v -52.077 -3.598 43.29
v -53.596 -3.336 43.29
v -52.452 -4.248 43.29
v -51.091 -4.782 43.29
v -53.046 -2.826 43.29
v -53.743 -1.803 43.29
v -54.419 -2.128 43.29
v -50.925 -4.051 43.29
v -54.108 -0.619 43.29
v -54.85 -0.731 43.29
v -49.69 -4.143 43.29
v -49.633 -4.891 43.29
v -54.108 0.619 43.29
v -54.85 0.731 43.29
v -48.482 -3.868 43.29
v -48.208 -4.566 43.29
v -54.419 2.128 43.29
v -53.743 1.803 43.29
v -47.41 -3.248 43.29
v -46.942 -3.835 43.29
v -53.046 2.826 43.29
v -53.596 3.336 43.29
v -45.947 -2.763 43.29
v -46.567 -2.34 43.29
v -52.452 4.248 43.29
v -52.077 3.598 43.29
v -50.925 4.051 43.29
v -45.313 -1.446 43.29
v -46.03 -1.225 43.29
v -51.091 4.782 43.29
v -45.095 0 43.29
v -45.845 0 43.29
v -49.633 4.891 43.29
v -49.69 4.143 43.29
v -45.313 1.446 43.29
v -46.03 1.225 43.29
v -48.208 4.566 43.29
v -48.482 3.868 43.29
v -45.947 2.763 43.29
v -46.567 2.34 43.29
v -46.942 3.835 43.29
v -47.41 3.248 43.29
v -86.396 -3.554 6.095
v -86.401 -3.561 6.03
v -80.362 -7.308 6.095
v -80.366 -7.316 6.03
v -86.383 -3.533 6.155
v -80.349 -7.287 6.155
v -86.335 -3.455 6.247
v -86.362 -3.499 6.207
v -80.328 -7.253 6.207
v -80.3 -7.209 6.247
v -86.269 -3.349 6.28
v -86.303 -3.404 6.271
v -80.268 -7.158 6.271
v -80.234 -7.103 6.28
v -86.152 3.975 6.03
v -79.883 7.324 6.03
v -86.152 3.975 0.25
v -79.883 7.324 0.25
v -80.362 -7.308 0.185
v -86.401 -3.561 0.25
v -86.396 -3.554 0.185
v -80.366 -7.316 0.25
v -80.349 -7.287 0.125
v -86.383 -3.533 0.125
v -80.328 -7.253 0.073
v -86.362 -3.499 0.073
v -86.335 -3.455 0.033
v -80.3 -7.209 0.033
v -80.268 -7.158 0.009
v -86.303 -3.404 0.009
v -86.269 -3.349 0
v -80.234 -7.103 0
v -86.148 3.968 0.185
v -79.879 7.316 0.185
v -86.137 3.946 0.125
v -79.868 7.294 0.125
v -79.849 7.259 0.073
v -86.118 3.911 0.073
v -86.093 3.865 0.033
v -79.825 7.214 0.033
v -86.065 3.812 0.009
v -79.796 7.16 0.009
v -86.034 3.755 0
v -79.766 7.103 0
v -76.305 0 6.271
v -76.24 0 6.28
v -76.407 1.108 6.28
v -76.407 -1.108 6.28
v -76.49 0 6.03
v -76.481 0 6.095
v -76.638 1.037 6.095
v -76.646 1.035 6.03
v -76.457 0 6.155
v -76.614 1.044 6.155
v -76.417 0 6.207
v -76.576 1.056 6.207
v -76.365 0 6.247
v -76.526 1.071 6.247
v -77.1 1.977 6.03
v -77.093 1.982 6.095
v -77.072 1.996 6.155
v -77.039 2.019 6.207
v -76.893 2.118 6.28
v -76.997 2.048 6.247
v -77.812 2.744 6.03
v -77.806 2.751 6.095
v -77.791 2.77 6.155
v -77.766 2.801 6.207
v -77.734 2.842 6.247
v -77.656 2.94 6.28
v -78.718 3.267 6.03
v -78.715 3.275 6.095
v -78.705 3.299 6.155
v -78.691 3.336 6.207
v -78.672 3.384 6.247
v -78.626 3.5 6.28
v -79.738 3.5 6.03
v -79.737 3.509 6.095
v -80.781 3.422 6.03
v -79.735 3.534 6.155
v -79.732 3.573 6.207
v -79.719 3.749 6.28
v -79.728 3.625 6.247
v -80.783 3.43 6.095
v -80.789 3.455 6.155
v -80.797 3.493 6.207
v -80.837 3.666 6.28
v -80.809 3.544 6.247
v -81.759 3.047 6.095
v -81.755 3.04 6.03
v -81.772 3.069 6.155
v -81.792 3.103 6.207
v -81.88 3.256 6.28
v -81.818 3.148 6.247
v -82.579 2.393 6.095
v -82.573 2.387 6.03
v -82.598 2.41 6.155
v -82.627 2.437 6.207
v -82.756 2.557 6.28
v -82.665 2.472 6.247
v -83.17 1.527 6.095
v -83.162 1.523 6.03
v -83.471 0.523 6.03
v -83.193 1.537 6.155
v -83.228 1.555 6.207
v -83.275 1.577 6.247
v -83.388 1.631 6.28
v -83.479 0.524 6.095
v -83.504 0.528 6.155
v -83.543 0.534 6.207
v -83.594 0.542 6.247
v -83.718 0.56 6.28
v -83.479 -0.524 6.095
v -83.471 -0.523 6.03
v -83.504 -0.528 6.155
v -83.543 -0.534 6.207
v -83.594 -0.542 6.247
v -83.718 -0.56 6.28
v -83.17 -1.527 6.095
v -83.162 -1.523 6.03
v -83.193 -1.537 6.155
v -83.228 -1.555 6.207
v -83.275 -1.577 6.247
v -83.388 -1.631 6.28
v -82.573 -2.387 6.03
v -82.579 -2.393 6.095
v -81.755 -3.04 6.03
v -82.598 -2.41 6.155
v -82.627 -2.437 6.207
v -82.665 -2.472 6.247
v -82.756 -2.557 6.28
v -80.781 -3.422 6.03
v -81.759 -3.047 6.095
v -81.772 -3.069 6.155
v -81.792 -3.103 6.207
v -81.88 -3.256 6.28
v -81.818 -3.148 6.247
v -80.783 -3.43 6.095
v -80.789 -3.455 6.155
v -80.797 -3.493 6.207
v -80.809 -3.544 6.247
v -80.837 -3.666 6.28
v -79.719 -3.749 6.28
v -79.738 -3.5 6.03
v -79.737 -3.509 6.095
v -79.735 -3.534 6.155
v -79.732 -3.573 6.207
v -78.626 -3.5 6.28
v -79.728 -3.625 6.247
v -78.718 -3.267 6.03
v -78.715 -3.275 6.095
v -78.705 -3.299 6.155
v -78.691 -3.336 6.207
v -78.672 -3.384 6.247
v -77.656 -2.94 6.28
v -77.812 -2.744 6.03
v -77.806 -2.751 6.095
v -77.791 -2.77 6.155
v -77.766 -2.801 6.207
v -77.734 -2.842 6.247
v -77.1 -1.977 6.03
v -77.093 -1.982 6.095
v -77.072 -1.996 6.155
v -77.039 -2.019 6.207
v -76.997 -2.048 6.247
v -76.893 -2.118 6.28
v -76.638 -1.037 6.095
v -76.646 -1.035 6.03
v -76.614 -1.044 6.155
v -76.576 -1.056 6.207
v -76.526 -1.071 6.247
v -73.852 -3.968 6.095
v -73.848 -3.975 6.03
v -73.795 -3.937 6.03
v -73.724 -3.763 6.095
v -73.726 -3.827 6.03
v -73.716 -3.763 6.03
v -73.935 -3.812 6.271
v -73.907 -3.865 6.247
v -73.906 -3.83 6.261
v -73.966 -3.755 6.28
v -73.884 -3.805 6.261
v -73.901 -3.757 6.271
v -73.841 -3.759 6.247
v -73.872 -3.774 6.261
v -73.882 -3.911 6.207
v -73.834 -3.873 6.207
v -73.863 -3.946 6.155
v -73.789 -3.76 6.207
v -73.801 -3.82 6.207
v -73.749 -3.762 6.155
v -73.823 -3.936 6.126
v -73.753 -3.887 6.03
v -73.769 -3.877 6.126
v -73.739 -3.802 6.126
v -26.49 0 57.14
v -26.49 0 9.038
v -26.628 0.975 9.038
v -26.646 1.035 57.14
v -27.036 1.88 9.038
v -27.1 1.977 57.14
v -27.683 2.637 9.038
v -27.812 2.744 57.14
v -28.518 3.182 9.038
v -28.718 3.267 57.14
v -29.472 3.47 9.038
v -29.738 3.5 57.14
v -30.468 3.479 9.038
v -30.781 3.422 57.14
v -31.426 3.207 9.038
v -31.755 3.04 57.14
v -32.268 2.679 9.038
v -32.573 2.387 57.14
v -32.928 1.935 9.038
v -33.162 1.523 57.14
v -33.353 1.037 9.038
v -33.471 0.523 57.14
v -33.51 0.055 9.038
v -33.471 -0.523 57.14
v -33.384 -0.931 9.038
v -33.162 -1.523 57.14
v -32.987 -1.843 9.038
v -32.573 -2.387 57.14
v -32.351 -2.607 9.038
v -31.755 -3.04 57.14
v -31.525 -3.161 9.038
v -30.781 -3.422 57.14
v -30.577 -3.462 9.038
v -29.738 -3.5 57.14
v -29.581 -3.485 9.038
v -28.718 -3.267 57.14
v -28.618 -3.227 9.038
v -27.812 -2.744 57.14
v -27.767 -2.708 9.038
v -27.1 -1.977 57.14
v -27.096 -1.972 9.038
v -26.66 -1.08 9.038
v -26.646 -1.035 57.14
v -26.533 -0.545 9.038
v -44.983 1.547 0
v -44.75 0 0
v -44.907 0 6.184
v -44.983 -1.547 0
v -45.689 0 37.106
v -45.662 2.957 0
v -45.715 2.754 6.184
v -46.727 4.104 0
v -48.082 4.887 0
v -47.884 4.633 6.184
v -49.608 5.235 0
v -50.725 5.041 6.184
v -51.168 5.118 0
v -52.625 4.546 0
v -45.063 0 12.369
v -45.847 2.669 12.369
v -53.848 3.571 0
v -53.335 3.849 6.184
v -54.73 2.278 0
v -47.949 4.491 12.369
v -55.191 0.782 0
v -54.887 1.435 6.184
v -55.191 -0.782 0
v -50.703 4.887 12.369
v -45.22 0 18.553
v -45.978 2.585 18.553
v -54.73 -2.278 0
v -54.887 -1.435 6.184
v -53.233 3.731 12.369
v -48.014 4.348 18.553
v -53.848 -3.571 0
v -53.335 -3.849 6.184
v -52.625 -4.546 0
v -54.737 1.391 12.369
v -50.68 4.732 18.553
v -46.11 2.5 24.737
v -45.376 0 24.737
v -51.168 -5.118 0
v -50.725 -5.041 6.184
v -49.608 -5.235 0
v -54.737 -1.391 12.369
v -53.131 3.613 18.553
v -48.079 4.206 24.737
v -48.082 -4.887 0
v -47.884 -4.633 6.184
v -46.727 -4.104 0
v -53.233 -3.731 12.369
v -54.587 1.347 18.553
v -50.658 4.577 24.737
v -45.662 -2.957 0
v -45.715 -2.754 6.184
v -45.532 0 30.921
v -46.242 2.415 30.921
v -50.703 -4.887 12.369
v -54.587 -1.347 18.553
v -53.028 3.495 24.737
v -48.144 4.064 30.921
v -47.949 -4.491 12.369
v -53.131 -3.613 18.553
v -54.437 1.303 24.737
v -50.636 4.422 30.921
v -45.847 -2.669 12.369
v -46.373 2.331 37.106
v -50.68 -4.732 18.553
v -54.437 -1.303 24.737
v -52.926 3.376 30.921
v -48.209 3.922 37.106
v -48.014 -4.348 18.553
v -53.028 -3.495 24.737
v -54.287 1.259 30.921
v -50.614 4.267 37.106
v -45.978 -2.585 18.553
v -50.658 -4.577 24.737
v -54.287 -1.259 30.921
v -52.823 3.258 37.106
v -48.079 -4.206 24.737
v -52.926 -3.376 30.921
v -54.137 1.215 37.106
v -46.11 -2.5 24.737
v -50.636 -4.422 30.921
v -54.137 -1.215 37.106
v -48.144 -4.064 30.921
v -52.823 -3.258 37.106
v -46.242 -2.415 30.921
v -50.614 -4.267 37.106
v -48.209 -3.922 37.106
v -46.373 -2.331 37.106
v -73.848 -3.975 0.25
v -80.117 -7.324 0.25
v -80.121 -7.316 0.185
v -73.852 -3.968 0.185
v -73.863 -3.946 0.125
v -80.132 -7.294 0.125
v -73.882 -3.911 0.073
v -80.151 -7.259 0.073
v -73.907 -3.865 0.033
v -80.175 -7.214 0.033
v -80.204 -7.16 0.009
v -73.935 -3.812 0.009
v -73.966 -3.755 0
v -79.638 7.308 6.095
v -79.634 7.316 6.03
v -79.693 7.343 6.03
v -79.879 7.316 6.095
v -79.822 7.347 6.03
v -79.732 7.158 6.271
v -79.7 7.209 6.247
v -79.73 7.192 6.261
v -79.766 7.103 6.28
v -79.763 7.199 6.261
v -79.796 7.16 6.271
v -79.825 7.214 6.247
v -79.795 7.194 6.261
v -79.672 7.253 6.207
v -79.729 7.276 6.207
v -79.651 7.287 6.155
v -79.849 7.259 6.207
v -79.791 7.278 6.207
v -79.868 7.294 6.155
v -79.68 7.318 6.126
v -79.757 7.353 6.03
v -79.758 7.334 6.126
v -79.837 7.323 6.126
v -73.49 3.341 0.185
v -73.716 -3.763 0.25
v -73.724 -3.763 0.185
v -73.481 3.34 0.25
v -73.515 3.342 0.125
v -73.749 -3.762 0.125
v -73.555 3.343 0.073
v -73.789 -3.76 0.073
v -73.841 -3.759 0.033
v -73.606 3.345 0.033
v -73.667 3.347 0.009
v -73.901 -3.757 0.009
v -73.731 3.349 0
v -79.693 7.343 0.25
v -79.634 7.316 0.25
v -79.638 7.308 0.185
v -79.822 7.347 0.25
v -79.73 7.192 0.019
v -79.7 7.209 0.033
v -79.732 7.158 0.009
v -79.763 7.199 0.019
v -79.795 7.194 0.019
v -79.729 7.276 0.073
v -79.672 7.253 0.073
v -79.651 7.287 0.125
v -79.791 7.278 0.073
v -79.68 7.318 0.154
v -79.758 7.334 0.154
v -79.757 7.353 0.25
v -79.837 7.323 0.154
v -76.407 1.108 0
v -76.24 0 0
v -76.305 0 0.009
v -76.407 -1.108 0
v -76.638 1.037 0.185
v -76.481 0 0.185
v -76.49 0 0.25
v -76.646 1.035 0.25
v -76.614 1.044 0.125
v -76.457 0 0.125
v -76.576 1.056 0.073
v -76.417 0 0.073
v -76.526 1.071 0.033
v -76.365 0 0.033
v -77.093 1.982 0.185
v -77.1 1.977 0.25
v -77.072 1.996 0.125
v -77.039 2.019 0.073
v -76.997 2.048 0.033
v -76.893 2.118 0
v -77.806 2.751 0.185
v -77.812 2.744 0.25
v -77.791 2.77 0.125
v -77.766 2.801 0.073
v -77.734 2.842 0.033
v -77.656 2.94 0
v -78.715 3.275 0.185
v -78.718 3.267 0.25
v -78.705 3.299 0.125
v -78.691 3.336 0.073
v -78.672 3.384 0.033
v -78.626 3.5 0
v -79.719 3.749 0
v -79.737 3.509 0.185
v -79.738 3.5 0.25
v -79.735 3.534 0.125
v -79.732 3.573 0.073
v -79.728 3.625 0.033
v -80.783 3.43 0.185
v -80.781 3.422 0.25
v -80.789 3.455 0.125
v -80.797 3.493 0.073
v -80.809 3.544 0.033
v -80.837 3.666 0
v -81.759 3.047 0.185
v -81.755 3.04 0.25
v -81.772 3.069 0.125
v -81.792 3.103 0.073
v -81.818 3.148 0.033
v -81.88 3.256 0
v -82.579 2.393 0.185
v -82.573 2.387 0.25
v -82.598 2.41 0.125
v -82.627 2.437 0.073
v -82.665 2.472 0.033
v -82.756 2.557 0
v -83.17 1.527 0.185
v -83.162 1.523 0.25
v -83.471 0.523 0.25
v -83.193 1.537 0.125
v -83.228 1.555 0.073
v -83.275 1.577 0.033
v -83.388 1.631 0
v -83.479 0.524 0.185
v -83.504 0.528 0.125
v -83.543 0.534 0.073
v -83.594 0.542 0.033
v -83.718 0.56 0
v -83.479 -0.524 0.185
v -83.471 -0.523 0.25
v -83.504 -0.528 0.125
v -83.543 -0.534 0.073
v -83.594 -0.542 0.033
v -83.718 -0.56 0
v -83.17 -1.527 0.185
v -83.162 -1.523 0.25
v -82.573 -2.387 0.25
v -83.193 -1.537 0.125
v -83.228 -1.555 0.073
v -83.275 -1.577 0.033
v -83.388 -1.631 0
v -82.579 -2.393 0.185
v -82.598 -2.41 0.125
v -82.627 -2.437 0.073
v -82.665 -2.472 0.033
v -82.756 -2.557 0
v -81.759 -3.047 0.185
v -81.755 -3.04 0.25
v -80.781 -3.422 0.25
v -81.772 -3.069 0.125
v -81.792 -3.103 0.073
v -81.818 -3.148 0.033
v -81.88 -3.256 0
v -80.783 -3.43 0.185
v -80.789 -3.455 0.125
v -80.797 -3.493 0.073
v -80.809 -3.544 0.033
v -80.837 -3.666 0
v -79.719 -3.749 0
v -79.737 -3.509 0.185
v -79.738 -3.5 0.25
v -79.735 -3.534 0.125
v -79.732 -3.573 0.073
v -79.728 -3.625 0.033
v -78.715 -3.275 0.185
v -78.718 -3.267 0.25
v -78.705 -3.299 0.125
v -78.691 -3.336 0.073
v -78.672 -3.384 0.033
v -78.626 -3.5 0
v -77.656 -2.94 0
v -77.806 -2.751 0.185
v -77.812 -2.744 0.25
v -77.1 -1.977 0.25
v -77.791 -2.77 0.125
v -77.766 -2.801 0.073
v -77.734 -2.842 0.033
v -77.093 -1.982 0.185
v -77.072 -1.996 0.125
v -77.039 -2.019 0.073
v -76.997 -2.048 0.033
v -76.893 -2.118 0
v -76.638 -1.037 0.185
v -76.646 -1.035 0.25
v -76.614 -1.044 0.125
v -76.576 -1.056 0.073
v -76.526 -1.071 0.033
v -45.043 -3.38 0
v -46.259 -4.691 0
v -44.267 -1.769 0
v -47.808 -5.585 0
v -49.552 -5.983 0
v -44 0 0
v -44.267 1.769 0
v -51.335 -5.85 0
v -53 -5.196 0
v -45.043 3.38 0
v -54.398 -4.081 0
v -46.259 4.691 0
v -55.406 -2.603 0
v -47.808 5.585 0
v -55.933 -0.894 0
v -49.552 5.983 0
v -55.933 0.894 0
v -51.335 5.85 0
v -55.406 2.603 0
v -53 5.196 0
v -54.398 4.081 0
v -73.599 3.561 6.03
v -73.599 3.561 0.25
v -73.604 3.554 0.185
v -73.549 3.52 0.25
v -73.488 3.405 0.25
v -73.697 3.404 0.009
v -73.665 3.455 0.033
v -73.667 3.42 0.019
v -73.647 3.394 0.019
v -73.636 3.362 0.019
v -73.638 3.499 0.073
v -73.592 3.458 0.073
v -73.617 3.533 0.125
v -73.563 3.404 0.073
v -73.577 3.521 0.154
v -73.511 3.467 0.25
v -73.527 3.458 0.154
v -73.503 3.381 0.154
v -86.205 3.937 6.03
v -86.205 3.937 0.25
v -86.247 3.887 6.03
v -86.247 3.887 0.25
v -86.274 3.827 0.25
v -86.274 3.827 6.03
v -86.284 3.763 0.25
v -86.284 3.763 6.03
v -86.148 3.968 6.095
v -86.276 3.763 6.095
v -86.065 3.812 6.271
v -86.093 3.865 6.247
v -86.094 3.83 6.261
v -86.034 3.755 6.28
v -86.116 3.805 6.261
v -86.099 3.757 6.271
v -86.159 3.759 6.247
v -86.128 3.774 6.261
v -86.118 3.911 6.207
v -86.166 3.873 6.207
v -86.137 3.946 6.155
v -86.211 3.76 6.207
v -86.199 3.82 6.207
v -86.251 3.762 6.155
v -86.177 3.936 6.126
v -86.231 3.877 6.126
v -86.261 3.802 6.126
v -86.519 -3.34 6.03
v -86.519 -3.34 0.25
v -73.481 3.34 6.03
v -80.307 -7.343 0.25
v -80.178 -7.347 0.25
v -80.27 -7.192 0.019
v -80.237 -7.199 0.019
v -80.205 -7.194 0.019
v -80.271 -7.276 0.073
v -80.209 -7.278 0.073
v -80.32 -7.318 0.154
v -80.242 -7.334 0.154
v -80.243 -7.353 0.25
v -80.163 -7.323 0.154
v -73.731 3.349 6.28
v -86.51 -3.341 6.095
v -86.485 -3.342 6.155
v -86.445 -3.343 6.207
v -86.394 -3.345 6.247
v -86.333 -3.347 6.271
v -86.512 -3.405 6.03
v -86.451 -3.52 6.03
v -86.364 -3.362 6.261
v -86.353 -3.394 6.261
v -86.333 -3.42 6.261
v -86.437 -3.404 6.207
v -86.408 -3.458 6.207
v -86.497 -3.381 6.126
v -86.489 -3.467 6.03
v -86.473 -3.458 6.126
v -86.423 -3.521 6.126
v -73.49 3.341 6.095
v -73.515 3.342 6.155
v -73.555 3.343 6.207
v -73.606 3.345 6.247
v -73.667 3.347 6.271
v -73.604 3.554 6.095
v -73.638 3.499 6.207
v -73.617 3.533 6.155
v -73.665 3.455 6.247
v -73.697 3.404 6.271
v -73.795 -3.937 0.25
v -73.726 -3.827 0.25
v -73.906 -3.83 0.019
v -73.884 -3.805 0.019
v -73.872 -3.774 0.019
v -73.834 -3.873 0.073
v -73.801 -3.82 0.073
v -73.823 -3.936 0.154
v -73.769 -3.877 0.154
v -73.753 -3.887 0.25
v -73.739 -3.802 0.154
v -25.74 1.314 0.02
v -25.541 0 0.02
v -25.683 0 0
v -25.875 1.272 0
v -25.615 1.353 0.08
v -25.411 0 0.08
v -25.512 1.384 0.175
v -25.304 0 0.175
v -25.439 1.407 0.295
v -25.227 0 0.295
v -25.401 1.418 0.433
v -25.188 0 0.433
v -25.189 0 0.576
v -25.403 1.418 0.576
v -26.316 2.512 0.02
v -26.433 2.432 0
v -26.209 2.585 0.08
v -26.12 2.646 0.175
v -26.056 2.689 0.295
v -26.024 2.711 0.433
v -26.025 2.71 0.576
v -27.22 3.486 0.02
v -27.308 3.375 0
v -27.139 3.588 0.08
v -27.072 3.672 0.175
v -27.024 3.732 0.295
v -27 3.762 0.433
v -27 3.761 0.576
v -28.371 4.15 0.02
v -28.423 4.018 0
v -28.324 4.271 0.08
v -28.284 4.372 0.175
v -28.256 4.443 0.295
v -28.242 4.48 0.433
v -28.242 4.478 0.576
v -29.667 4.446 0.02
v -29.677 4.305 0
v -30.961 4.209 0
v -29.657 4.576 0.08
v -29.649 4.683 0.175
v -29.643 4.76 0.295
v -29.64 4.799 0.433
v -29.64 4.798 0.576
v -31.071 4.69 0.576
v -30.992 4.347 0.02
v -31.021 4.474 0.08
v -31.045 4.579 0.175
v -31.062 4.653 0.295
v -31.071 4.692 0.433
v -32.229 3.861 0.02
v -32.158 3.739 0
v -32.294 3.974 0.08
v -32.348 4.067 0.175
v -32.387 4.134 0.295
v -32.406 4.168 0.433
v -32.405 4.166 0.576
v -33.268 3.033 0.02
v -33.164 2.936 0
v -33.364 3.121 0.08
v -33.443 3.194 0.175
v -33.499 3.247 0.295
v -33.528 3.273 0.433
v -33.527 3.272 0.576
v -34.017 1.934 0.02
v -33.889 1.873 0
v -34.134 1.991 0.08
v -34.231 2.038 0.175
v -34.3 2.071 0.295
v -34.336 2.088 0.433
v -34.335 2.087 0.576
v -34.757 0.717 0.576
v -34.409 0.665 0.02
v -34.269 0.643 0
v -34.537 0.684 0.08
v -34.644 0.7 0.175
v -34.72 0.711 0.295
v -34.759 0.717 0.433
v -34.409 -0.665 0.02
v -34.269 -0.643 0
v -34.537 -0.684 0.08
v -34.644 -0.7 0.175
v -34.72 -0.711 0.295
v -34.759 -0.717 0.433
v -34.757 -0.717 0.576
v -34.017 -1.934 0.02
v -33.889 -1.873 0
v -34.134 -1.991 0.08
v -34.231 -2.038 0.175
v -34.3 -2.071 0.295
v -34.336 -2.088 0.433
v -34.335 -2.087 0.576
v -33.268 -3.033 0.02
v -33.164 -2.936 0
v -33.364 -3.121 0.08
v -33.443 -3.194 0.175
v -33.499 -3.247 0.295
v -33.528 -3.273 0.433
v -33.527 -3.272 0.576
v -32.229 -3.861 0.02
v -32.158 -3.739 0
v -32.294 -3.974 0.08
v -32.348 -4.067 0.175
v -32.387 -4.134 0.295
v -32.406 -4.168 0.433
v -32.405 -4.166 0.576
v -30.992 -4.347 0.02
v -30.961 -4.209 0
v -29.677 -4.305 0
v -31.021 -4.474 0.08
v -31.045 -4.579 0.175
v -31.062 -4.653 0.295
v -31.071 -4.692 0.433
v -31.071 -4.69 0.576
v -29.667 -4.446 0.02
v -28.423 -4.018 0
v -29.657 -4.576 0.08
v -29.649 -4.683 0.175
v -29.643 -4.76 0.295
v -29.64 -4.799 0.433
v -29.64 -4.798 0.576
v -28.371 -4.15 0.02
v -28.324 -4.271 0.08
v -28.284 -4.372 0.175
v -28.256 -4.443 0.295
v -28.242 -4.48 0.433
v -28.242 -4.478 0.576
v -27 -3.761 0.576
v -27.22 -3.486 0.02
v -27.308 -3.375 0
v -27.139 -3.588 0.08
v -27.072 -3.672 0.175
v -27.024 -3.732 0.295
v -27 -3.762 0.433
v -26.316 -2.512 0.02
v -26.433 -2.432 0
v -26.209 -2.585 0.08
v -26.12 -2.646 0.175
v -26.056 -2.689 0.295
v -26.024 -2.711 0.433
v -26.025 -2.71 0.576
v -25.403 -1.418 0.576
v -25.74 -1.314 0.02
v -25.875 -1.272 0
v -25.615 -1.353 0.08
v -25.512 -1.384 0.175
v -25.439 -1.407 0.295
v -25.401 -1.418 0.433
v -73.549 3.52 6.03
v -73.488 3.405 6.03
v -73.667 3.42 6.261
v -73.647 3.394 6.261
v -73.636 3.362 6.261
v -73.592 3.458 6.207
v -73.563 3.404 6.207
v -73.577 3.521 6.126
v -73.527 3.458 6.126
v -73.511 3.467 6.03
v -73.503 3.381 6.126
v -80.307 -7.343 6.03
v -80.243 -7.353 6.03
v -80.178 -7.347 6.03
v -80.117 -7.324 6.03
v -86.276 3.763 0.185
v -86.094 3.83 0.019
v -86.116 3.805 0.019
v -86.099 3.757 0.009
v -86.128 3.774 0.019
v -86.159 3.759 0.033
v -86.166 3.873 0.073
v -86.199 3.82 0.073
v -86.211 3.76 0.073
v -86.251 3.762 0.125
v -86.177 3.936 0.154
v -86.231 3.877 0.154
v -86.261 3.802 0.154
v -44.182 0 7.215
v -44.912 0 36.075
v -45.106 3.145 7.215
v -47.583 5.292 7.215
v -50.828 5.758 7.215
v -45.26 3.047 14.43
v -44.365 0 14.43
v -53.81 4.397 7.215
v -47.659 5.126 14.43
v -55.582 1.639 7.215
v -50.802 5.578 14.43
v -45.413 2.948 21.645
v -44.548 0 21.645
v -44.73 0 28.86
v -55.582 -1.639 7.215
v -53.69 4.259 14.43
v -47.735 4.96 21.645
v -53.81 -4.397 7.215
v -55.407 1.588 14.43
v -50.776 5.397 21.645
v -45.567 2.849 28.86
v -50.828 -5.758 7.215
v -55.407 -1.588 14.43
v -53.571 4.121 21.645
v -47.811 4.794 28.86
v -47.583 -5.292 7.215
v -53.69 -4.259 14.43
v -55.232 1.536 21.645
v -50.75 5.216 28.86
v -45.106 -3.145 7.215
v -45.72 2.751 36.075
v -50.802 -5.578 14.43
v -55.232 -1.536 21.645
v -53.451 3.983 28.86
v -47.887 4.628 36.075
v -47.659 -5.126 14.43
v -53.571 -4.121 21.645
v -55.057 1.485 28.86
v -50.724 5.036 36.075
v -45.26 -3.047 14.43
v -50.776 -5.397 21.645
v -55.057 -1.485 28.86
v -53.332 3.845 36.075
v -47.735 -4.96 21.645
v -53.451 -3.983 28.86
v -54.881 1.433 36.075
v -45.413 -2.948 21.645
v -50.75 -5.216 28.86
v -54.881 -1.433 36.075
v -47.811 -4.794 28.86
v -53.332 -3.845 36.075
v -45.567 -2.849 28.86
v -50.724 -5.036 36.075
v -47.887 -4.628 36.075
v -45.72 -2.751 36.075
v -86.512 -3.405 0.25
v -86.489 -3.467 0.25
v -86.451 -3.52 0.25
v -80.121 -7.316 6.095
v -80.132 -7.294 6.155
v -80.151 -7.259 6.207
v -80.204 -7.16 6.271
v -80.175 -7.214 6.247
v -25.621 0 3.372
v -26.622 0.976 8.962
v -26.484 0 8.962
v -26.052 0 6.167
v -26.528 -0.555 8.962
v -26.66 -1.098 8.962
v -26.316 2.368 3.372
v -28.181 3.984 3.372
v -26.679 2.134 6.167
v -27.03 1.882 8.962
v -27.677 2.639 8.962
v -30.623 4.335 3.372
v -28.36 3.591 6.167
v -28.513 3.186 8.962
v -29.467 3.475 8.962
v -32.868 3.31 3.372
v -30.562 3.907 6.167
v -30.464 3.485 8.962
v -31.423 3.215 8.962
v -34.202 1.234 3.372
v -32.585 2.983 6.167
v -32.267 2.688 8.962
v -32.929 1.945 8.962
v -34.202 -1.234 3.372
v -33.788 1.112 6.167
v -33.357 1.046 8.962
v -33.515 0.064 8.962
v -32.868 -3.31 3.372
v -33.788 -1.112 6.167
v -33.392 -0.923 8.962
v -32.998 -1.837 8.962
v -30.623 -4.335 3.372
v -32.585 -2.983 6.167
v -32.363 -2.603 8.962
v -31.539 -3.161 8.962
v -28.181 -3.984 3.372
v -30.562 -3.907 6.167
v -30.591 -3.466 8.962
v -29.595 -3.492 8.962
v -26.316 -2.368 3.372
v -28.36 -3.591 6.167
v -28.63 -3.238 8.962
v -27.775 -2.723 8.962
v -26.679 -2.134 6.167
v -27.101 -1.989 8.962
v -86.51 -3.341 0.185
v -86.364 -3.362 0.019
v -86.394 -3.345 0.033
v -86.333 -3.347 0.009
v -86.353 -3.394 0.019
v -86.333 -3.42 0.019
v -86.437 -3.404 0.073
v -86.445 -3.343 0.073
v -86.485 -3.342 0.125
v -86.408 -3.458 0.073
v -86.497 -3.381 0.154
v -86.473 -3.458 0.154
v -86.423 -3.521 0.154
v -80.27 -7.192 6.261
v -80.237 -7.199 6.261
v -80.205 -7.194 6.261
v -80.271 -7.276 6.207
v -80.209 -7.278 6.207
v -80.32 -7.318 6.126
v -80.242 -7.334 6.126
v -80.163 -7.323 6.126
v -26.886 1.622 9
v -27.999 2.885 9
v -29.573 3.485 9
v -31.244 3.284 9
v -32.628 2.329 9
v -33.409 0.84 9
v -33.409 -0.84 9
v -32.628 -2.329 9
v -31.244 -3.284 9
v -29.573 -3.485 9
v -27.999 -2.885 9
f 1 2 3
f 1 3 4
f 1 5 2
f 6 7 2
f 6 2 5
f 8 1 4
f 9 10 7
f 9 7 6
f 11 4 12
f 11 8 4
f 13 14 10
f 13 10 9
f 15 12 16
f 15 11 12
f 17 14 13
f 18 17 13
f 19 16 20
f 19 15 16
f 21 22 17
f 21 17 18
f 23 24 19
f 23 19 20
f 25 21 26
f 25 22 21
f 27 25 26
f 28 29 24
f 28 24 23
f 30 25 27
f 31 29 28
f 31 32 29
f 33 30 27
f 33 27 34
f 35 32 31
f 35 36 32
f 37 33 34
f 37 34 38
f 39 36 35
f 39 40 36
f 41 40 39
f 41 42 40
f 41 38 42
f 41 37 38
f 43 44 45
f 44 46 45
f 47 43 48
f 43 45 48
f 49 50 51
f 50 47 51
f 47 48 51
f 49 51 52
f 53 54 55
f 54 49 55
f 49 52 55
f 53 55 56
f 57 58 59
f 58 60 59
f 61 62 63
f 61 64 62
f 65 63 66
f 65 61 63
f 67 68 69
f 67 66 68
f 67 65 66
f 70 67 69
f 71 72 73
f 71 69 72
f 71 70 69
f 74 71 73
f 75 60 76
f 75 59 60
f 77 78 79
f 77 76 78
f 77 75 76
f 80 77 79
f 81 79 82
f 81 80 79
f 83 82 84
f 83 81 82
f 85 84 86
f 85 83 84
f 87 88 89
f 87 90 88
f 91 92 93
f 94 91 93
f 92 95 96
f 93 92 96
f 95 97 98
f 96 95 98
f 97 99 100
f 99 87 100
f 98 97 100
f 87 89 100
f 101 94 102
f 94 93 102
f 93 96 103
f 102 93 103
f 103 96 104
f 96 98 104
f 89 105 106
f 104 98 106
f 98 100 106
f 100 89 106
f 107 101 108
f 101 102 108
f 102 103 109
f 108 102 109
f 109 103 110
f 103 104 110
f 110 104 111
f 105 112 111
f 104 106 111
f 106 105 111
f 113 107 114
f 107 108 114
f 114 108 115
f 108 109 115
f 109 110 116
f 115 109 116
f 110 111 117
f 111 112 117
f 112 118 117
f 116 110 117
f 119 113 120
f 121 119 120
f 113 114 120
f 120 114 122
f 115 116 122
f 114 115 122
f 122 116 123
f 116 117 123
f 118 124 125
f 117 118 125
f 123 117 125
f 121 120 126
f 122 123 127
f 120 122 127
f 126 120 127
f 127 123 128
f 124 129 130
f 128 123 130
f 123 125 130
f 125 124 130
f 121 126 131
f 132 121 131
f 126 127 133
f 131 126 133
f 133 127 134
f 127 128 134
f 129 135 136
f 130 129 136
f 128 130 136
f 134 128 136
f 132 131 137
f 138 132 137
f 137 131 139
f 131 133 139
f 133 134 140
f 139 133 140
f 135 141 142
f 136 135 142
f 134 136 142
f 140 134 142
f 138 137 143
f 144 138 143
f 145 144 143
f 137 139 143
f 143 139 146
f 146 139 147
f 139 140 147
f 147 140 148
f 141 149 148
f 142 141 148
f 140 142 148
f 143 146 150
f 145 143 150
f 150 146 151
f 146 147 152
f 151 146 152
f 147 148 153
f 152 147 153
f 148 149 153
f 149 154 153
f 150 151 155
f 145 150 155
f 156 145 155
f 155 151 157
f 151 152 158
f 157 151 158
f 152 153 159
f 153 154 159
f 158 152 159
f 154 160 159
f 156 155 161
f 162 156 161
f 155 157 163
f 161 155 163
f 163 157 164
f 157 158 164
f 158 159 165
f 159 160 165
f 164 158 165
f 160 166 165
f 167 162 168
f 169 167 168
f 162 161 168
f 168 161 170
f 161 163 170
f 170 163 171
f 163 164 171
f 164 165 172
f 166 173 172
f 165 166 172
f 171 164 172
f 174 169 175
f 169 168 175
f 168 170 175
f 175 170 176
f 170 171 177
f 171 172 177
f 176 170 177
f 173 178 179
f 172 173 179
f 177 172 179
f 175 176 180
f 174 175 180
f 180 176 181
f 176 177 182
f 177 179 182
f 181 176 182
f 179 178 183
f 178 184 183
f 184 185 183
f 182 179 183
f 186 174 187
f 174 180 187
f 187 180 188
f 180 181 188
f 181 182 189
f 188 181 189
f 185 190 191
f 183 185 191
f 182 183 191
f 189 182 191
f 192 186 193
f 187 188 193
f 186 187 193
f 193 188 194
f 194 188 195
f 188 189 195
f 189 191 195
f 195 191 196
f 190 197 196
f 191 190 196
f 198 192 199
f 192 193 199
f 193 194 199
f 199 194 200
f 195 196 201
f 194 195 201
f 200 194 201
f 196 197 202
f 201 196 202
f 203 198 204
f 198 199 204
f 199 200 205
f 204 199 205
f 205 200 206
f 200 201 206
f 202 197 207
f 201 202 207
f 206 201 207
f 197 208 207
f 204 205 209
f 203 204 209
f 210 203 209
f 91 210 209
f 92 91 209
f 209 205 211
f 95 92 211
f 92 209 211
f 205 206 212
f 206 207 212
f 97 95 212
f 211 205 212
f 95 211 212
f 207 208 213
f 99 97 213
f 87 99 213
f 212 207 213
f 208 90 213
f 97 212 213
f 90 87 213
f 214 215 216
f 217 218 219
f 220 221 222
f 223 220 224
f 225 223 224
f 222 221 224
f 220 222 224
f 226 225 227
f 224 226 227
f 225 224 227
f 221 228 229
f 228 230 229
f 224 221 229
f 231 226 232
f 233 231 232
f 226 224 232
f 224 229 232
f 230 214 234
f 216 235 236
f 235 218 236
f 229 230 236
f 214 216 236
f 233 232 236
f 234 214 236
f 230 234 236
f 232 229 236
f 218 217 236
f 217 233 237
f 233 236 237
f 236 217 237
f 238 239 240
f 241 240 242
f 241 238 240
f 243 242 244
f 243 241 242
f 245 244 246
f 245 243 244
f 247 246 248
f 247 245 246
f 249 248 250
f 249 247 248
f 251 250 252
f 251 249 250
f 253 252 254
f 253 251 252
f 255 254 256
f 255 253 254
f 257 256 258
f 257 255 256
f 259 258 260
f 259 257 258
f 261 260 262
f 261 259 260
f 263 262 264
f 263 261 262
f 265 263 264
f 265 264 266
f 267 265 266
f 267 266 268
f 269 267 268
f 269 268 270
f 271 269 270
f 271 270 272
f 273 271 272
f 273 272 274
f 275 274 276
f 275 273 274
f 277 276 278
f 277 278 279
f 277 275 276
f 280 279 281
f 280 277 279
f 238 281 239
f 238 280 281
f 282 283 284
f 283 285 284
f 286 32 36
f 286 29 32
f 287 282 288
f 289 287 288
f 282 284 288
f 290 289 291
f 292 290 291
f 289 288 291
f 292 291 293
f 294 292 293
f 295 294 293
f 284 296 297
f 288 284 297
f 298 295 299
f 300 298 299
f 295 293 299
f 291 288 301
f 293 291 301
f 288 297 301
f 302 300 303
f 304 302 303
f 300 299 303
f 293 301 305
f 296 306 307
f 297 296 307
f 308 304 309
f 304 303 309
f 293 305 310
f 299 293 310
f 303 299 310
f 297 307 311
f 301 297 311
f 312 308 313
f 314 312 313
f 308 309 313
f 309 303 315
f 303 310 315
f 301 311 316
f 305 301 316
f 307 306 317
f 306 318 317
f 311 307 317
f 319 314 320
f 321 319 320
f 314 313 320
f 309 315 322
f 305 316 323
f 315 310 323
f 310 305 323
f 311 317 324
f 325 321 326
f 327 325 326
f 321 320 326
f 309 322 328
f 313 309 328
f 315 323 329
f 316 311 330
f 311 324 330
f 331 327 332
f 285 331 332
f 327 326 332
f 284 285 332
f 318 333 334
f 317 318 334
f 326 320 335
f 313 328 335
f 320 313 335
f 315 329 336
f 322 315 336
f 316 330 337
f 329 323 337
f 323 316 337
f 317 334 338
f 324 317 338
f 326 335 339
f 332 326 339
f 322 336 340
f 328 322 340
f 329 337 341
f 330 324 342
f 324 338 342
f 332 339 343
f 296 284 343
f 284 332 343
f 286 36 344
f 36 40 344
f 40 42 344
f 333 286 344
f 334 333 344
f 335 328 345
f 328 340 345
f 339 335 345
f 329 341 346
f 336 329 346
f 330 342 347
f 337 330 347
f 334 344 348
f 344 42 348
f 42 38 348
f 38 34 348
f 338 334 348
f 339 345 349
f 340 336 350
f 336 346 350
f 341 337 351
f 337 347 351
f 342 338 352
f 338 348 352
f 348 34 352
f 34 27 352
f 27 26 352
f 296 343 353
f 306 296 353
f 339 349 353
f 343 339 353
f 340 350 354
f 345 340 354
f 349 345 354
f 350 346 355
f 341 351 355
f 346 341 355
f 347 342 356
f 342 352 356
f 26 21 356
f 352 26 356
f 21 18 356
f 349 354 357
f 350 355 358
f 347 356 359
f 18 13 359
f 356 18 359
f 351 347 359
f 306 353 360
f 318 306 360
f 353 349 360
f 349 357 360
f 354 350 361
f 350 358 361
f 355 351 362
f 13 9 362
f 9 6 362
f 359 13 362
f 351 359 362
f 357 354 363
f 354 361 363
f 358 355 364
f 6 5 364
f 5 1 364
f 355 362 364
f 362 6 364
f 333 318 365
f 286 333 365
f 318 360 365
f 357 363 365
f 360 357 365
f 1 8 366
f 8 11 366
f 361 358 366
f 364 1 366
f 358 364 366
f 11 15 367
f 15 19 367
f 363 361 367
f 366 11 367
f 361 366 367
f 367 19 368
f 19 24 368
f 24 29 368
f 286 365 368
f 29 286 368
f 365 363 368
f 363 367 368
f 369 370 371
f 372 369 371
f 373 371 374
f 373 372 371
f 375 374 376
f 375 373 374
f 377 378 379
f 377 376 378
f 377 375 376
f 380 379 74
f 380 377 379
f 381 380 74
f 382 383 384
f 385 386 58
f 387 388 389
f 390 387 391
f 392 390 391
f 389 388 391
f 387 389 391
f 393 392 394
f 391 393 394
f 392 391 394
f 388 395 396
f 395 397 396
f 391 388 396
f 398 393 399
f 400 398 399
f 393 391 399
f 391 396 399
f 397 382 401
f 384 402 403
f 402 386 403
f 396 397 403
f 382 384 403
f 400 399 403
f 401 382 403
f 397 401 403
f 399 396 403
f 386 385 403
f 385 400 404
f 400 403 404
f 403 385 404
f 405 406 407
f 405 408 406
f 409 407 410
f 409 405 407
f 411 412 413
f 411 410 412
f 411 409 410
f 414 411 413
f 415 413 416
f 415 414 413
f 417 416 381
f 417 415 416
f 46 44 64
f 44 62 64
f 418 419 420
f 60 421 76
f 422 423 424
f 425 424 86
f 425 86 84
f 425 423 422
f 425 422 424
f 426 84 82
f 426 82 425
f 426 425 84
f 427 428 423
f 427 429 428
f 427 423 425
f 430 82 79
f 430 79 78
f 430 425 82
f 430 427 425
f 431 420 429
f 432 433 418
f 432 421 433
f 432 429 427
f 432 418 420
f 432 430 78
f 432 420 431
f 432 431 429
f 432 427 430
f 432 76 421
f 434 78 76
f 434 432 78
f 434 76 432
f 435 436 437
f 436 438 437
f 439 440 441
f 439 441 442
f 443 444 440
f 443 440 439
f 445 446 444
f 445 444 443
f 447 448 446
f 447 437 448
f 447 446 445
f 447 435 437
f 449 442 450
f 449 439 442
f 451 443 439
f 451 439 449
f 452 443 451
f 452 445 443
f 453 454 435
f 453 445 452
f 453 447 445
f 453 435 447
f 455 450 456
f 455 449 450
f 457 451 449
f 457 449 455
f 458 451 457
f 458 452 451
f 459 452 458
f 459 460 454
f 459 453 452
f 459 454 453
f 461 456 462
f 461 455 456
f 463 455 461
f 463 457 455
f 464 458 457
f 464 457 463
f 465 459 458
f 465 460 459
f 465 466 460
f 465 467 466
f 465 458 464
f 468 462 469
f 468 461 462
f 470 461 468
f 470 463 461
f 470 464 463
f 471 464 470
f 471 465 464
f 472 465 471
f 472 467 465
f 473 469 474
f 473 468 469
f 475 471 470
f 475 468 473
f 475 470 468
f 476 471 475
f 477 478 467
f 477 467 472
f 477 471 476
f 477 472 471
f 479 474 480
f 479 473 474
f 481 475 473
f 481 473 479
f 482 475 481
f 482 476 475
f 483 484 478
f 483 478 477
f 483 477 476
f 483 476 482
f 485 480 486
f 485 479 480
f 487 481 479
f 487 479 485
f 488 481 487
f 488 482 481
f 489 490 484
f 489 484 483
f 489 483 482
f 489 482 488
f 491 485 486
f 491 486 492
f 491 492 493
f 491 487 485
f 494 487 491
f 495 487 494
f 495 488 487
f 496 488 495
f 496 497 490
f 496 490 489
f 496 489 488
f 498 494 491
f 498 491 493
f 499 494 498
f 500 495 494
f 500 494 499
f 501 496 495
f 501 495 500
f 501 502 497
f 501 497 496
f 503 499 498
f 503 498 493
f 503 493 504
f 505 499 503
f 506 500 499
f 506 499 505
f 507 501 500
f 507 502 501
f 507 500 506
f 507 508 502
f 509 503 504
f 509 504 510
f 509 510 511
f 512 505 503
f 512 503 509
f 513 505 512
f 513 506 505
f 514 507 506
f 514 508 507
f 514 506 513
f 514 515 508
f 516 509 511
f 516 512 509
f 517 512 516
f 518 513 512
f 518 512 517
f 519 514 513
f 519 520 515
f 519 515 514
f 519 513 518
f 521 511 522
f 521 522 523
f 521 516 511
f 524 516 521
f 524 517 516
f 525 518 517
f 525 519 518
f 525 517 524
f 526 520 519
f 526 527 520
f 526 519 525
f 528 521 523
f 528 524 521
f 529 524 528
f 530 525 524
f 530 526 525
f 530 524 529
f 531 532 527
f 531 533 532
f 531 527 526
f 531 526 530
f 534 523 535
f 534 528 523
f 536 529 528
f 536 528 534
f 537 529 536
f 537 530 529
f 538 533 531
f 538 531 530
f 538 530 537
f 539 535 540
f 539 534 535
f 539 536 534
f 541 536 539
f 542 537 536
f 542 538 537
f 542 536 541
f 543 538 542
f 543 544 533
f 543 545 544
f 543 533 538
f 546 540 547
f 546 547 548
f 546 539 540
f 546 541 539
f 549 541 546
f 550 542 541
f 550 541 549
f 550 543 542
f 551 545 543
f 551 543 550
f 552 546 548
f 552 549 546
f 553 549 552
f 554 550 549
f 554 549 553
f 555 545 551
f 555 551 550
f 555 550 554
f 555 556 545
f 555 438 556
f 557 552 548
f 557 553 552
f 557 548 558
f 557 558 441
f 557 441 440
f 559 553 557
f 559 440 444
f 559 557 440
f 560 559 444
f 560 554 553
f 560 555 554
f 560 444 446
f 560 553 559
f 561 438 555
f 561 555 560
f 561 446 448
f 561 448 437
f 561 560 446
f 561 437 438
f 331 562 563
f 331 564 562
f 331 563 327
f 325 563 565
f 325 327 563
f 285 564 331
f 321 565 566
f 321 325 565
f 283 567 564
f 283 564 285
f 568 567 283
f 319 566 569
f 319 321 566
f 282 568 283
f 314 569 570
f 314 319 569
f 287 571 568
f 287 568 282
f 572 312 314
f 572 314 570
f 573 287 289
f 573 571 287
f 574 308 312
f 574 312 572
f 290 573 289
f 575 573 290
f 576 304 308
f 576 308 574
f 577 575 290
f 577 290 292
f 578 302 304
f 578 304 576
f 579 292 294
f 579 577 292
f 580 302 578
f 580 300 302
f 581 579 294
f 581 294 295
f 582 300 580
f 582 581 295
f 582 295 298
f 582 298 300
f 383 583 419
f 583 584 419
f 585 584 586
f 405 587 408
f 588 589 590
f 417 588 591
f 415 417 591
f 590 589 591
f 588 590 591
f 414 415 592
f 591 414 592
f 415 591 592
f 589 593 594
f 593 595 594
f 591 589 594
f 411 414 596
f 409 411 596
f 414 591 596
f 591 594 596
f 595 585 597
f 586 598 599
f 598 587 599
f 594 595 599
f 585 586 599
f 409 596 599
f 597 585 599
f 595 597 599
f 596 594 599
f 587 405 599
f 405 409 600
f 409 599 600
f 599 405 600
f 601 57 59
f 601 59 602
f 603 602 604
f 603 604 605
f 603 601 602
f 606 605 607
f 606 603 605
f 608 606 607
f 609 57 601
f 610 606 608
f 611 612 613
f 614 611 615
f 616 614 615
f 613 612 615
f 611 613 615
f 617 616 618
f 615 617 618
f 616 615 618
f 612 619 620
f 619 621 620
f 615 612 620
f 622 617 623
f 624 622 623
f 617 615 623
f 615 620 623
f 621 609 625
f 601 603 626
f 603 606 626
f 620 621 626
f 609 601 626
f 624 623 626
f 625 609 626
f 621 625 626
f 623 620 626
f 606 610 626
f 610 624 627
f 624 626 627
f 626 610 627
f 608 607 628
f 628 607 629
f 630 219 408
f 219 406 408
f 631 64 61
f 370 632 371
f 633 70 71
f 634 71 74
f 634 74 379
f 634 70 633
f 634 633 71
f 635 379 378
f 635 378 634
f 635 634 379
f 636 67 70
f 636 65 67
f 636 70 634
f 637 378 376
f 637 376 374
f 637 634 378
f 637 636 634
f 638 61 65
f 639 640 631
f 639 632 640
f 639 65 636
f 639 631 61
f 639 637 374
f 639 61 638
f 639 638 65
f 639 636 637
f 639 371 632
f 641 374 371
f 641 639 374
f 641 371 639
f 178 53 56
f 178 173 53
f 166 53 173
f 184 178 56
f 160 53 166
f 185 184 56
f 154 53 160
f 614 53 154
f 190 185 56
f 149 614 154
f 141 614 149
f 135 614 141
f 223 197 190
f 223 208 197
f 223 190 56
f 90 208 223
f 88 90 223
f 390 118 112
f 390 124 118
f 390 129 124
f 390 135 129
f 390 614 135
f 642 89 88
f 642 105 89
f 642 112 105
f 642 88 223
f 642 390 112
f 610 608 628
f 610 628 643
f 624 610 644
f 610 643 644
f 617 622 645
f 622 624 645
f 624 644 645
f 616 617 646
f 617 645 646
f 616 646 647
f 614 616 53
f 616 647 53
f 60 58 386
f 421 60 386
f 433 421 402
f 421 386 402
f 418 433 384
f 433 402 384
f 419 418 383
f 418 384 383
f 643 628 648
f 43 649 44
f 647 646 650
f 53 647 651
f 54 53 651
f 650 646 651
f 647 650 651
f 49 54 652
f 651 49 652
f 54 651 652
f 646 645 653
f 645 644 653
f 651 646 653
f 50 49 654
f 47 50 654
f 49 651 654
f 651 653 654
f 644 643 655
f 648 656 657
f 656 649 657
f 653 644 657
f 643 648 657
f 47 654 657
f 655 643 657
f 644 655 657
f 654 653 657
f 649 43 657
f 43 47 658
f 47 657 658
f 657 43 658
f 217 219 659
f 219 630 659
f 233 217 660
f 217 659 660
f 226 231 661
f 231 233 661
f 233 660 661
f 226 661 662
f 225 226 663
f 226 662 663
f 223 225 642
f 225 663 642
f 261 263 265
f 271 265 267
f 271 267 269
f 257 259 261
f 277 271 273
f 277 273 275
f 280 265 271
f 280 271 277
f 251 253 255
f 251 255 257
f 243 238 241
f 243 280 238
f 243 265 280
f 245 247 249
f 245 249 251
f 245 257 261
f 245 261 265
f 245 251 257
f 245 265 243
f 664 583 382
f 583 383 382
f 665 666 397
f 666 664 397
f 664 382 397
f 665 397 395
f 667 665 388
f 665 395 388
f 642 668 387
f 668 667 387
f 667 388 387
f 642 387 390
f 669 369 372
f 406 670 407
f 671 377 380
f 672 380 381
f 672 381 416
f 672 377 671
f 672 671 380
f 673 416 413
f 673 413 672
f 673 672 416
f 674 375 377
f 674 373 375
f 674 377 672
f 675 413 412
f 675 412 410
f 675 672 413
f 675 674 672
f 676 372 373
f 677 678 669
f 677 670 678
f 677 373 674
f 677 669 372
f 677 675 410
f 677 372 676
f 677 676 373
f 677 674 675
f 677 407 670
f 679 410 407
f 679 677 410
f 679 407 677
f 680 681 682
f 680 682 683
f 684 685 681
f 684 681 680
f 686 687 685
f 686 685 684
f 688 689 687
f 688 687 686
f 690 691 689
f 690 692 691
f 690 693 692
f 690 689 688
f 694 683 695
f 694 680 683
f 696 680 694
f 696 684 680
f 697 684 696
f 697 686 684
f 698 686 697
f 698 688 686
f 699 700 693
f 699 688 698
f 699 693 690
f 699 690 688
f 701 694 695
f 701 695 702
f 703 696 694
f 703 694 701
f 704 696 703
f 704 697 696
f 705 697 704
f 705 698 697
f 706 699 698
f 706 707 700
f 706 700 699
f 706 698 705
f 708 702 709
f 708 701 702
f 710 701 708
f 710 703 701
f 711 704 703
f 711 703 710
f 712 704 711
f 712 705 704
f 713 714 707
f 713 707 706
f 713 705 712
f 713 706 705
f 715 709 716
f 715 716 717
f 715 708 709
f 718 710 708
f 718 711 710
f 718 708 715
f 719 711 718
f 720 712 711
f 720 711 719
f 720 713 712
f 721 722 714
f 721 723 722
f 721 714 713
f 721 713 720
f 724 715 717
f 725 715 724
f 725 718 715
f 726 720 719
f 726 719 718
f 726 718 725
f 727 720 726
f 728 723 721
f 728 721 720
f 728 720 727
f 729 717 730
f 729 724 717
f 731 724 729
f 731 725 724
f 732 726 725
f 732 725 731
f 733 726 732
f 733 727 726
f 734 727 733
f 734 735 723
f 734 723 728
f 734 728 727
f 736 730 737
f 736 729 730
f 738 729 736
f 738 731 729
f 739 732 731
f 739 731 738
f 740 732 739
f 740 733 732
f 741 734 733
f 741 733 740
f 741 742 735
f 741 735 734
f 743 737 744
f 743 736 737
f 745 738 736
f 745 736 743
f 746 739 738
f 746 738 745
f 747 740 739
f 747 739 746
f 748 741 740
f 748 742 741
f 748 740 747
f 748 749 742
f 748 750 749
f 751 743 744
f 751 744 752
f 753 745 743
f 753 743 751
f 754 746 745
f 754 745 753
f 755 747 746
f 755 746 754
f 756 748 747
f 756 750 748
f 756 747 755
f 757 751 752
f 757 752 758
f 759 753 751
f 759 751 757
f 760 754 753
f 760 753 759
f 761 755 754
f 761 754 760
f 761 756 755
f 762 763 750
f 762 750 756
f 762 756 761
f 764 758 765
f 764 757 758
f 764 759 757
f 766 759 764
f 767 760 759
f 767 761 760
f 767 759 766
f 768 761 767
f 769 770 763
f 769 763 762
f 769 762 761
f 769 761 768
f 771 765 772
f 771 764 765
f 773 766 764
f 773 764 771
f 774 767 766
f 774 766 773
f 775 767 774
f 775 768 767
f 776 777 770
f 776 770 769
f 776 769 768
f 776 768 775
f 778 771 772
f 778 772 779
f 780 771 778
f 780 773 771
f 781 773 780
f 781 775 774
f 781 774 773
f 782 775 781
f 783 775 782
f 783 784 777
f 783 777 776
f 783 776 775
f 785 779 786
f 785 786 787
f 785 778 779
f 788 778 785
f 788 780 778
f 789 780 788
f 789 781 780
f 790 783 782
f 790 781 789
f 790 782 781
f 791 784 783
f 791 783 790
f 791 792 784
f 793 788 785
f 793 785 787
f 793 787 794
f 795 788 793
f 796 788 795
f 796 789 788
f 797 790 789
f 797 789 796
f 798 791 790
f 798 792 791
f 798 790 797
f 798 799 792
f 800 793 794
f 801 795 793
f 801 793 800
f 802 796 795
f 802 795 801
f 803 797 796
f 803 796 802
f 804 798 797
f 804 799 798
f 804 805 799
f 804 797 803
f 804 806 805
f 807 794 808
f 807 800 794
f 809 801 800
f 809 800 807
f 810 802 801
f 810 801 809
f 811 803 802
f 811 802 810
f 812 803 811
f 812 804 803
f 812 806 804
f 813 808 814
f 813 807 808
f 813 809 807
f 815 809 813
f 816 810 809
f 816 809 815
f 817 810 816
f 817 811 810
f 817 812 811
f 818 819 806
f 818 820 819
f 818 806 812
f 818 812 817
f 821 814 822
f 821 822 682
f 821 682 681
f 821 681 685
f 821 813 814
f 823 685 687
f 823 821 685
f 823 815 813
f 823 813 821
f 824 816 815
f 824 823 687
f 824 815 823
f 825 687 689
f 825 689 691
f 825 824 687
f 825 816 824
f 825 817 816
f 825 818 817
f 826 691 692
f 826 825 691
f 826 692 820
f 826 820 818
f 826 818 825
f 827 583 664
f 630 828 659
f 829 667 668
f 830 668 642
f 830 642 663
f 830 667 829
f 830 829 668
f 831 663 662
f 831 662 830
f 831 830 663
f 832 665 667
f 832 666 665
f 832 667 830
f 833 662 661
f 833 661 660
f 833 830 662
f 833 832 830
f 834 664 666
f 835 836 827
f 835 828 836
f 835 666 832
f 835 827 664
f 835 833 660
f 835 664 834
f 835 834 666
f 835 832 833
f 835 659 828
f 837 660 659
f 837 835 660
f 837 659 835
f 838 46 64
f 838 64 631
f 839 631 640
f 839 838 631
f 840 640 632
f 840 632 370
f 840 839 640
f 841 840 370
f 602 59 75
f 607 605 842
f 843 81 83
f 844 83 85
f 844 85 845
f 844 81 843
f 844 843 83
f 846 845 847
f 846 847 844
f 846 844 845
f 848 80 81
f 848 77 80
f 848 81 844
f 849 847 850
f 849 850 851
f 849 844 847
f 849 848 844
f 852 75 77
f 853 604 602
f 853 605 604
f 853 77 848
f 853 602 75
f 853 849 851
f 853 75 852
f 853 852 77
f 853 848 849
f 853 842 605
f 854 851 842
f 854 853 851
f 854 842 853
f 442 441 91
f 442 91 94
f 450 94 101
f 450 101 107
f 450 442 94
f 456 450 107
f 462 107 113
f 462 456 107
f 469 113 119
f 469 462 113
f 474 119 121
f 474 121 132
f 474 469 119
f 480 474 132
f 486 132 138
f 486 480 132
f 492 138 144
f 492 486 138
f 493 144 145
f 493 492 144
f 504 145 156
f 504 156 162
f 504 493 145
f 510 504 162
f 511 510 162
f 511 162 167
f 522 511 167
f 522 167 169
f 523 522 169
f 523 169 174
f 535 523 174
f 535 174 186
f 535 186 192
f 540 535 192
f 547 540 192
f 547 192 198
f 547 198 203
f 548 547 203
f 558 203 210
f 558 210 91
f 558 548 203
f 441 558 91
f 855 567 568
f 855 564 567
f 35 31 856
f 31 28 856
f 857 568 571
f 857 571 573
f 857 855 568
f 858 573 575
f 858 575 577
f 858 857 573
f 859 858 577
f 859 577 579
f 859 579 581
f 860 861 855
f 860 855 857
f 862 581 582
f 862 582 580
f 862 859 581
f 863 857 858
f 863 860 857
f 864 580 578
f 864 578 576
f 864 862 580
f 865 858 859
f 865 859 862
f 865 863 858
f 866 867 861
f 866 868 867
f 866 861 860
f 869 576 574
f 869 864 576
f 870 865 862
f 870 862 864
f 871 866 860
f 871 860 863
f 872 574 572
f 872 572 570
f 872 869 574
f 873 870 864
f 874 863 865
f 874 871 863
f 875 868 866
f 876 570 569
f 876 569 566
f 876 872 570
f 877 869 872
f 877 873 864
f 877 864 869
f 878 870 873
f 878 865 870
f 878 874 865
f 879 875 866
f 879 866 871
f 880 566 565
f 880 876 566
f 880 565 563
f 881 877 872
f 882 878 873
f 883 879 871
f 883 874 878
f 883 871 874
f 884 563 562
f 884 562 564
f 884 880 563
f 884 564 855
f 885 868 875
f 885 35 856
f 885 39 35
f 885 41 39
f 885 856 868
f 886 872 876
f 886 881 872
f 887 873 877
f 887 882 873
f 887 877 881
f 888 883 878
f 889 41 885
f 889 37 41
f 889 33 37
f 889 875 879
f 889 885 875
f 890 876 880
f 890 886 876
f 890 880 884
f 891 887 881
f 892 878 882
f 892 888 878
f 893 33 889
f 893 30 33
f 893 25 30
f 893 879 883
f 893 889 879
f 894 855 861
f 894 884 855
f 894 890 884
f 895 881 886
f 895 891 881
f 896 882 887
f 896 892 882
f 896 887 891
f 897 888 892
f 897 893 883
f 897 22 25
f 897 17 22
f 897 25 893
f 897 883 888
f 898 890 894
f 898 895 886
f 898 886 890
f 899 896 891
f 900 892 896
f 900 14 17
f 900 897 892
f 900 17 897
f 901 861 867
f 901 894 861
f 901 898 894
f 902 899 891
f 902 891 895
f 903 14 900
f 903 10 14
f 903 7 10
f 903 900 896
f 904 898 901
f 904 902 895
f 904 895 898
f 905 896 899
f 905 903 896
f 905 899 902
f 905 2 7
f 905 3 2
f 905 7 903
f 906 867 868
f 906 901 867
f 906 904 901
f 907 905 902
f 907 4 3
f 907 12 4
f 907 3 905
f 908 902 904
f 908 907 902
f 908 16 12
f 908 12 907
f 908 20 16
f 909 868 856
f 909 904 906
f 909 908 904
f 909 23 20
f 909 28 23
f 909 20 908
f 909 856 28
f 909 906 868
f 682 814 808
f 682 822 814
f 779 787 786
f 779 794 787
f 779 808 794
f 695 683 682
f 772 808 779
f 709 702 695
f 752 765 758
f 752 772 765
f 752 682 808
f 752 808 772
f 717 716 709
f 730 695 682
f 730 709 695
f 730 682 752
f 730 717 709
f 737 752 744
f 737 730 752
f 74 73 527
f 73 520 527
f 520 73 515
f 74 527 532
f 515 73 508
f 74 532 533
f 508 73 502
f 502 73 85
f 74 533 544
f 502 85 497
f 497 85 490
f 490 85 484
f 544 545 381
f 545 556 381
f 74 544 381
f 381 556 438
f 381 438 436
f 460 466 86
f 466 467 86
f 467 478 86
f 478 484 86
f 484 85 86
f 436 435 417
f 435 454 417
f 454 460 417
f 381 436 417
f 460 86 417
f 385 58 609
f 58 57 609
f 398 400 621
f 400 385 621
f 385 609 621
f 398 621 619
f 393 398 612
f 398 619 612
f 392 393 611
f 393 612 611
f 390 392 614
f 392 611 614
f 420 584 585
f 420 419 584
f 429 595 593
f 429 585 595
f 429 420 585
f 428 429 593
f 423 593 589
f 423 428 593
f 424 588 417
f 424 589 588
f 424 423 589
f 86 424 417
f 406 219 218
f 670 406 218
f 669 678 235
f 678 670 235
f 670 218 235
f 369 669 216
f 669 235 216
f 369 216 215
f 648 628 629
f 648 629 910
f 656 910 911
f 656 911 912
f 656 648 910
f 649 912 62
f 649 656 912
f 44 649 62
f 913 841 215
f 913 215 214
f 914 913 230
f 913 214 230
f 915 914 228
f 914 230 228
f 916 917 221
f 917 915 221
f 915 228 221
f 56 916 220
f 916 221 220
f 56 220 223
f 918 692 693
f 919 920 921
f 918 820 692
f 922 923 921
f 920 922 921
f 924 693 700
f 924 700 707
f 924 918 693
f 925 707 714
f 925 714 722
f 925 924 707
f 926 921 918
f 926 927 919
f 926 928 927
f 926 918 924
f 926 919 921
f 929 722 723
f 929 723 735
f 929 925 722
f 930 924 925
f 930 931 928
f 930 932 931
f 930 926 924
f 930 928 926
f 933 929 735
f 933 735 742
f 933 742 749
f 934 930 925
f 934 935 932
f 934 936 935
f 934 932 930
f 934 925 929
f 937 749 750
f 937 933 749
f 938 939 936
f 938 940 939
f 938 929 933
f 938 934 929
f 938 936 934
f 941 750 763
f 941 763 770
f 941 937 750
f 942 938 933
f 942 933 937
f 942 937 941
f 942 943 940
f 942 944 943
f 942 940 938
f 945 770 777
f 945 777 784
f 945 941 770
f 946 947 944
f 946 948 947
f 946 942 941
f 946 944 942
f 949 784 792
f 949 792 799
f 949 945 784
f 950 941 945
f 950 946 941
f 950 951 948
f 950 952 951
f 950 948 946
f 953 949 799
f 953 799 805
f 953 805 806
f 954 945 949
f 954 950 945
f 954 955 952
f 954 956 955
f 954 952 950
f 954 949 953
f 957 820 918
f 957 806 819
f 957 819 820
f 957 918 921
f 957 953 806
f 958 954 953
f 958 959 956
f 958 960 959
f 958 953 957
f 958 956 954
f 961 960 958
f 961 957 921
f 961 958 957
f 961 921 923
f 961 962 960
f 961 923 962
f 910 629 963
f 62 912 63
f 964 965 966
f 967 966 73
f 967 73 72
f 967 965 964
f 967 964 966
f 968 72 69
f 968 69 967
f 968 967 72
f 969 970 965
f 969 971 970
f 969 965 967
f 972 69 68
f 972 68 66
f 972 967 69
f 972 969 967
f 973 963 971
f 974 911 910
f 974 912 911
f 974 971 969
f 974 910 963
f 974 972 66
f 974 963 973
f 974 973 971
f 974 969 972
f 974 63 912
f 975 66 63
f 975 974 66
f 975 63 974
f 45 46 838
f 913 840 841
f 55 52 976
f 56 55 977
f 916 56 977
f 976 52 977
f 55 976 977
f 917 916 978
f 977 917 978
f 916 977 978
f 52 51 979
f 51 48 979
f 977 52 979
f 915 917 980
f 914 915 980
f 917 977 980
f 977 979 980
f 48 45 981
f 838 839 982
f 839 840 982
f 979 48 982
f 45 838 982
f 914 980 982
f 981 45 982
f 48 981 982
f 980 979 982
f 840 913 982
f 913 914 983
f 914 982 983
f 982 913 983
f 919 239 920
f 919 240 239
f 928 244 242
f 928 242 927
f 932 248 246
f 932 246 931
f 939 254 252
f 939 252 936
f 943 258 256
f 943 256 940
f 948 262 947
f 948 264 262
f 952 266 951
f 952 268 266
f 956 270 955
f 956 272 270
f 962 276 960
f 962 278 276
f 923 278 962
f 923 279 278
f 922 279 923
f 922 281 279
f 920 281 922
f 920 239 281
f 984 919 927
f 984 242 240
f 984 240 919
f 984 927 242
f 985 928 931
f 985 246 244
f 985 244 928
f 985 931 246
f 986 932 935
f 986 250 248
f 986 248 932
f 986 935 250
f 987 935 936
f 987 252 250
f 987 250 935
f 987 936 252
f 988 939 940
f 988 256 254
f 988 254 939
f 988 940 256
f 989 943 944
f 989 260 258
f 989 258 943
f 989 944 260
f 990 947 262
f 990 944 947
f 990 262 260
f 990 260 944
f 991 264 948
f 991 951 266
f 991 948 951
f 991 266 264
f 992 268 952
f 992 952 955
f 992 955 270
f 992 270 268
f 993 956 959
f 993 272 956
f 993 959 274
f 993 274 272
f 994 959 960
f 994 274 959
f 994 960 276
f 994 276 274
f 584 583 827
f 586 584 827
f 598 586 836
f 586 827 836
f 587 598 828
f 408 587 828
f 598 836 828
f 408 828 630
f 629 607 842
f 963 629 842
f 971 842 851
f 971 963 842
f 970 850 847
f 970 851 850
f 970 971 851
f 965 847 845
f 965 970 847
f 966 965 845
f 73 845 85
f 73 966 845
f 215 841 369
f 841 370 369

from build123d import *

# Parameters (mm, degrees)
F3_R     = 0.5
F6_T     = -0.75
F7_R     = 3.51
F8_DEPTH = 6.28
F9_R     = 0.25


with BuildPart() as f2:
    # F1 (on Front) → F2 (revolve)
    with BuildSketch(Plane.XZ):
        Polygon((-30, 13.08), (-30, 9), (-26.49, 9), (-26.49, 57.14), (-30, 57.14), align=None)
        Polygon((-30, 9), (-30, 0), (-25.1, 0), (-26.49, 9), align=None)
    revolve(axis=Axis((-30, 0, 28.57), (0, 0, 1)))

    # F3
    f3_edges = [f2.edges().sort_by_distance(p)[0] for p in [
        (-34.9, 0, 0),
        (-33.51, 0, 9),
    ]]
    fillet(f3_edges, radius=F3_R)


with BuildPart() as f5:
    # F4 (on Front) → F5 (revolve)
    with BuildSketch(Plane.XZ):
        Polygon((-50, 43.29), (-50, 0), (-44, 0), (-45.095, 43.29), align=None)
    revolve(axis=Axis((-50, 0, 21.645), (0, 0, 1)))

    # F6
    f6_openings = [f5.faces().sort_by_distance(p)[0] for p in [
        (-50, 0, 43.29),
        (-50, 0, 0),
    ]]
    offset(amount=F6_T, openings=f6_openings)


with BuildPart() as f8:
    # F7 (on Top) → F8 (new body)
    with BuildSketch(Plane.XY):
        Polygon((-79.7561682365, 7.3918364478), (-86.2796022627, 3.9070827253), (-86.5234340262, -3.4847537225), (-80.2438317635, -7.3918364478), (-73.7203977373, -3.9070827253), (-73.4765659738, 3.4847537225), align=None)
        with Locations((-80, 0)):
            Circle(F7_R, mode=Mode.SUBTRACT)
    extrude(amount=F8_DEPTH)

    # F9
    f9_edges = [f8.edges().sort_by_distance(p)[0] for p in [
        (-76.616367, 5.438295, 6.28),
        (-83.017885, 5.64946, 6.28),
        (-86.401518, 0.211165, 6.28),
        (-83.383633, -5.438295, 6.28),
        (-76.982115, -5.64946, 6.28),
        (-73.598482, -0.211165, 6.28),
        (-83.51, 0, 6.28),
        (-76.616367, 5.438295, 0),
        (-83.017885, 5.64946, 0),
        (-86.401518, 0.211165, 0),
        (-83.383633, -5.438295, 0),
        (-76.982115, -5.64946, 0),
        (-73.598482, -0.211165, 0),
        (-83.51, 0, 0),
        (-86.523434, -3.484754, 3.14),
        (-80.243832, -7.391836, 3.14),
        (-73.720398, -3.907083, 3.14),
        (-73.476566, 3.484754, 3.14),
        (-79.756168, 7.391836, 3.14),
        (-86.279602, 3.907083, 3.14),
    ]]
    fillet(f9_edges, radius=F9_R)


solid = Compound([f2.part, f5.part, f8.part])
